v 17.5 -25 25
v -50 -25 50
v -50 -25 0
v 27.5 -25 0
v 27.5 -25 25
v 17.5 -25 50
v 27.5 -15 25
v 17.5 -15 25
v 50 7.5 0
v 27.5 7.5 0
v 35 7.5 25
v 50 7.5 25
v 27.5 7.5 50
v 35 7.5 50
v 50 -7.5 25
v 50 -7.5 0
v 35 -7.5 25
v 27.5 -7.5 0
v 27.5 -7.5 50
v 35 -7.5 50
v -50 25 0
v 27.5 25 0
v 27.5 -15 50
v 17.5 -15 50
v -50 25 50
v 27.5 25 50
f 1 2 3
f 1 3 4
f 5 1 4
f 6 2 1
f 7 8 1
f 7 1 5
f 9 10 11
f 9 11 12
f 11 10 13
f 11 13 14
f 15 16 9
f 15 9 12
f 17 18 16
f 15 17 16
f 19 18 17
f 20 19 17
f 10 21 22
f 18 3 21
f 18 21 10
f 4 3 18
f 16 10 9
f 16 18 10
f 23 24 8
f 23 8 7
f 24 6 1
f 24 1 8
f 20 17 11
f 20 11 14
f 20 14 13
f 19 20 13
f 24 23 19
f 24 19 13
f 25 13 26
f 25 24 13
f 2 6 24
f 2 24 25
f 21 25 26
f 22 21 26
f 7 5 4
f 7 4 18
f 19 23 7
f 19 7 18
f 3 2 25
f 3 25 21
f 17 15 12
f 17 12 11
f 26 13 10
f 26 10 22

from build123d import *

# Parameters (mm, degrees)
F1_DEPTH = 25
F2_W     = 22.5
F2_H     = 17.5
F3_DEPTH = 50
F4_W     = 10
F4_H     = 10
F5_DEPTH = 25


with BuildPart() as f1:
    # F0 (on Front) → F1 (new body, symmetric)
    with BuildSketch(Plane.XZ):
        Polygon((35, 50), (-50, 50), (-50, 0), (50, 0), (50, 25), (35, 25), align=None)
    extrude(amount=F1_DEPTH, both=True)

    # F2 (on face) → F3 (cut, through all)
    with BuildSketch(Plane.XY.offset(50)):
        with Locations((38.75, 16.25)):
            Rectangle(F2_W, F2_H)
        with Locations((38.75, -16.25)):
            Rectangle(F2_W, F2_H)
    extrude(amount=-F3_DEPTH, mode=Mode.SUBTRACT)

    # F4 (on face) → F5 (cut)
    with BuildSketch(Plane.XY.offset(50)):
        with Locations((22.5, -20)):
            Rectangle(F4_W, F4_H)
    extrude(amount=-F5_DEPTH, mode=Mode.SUBTRACT)


solid = f1.part
